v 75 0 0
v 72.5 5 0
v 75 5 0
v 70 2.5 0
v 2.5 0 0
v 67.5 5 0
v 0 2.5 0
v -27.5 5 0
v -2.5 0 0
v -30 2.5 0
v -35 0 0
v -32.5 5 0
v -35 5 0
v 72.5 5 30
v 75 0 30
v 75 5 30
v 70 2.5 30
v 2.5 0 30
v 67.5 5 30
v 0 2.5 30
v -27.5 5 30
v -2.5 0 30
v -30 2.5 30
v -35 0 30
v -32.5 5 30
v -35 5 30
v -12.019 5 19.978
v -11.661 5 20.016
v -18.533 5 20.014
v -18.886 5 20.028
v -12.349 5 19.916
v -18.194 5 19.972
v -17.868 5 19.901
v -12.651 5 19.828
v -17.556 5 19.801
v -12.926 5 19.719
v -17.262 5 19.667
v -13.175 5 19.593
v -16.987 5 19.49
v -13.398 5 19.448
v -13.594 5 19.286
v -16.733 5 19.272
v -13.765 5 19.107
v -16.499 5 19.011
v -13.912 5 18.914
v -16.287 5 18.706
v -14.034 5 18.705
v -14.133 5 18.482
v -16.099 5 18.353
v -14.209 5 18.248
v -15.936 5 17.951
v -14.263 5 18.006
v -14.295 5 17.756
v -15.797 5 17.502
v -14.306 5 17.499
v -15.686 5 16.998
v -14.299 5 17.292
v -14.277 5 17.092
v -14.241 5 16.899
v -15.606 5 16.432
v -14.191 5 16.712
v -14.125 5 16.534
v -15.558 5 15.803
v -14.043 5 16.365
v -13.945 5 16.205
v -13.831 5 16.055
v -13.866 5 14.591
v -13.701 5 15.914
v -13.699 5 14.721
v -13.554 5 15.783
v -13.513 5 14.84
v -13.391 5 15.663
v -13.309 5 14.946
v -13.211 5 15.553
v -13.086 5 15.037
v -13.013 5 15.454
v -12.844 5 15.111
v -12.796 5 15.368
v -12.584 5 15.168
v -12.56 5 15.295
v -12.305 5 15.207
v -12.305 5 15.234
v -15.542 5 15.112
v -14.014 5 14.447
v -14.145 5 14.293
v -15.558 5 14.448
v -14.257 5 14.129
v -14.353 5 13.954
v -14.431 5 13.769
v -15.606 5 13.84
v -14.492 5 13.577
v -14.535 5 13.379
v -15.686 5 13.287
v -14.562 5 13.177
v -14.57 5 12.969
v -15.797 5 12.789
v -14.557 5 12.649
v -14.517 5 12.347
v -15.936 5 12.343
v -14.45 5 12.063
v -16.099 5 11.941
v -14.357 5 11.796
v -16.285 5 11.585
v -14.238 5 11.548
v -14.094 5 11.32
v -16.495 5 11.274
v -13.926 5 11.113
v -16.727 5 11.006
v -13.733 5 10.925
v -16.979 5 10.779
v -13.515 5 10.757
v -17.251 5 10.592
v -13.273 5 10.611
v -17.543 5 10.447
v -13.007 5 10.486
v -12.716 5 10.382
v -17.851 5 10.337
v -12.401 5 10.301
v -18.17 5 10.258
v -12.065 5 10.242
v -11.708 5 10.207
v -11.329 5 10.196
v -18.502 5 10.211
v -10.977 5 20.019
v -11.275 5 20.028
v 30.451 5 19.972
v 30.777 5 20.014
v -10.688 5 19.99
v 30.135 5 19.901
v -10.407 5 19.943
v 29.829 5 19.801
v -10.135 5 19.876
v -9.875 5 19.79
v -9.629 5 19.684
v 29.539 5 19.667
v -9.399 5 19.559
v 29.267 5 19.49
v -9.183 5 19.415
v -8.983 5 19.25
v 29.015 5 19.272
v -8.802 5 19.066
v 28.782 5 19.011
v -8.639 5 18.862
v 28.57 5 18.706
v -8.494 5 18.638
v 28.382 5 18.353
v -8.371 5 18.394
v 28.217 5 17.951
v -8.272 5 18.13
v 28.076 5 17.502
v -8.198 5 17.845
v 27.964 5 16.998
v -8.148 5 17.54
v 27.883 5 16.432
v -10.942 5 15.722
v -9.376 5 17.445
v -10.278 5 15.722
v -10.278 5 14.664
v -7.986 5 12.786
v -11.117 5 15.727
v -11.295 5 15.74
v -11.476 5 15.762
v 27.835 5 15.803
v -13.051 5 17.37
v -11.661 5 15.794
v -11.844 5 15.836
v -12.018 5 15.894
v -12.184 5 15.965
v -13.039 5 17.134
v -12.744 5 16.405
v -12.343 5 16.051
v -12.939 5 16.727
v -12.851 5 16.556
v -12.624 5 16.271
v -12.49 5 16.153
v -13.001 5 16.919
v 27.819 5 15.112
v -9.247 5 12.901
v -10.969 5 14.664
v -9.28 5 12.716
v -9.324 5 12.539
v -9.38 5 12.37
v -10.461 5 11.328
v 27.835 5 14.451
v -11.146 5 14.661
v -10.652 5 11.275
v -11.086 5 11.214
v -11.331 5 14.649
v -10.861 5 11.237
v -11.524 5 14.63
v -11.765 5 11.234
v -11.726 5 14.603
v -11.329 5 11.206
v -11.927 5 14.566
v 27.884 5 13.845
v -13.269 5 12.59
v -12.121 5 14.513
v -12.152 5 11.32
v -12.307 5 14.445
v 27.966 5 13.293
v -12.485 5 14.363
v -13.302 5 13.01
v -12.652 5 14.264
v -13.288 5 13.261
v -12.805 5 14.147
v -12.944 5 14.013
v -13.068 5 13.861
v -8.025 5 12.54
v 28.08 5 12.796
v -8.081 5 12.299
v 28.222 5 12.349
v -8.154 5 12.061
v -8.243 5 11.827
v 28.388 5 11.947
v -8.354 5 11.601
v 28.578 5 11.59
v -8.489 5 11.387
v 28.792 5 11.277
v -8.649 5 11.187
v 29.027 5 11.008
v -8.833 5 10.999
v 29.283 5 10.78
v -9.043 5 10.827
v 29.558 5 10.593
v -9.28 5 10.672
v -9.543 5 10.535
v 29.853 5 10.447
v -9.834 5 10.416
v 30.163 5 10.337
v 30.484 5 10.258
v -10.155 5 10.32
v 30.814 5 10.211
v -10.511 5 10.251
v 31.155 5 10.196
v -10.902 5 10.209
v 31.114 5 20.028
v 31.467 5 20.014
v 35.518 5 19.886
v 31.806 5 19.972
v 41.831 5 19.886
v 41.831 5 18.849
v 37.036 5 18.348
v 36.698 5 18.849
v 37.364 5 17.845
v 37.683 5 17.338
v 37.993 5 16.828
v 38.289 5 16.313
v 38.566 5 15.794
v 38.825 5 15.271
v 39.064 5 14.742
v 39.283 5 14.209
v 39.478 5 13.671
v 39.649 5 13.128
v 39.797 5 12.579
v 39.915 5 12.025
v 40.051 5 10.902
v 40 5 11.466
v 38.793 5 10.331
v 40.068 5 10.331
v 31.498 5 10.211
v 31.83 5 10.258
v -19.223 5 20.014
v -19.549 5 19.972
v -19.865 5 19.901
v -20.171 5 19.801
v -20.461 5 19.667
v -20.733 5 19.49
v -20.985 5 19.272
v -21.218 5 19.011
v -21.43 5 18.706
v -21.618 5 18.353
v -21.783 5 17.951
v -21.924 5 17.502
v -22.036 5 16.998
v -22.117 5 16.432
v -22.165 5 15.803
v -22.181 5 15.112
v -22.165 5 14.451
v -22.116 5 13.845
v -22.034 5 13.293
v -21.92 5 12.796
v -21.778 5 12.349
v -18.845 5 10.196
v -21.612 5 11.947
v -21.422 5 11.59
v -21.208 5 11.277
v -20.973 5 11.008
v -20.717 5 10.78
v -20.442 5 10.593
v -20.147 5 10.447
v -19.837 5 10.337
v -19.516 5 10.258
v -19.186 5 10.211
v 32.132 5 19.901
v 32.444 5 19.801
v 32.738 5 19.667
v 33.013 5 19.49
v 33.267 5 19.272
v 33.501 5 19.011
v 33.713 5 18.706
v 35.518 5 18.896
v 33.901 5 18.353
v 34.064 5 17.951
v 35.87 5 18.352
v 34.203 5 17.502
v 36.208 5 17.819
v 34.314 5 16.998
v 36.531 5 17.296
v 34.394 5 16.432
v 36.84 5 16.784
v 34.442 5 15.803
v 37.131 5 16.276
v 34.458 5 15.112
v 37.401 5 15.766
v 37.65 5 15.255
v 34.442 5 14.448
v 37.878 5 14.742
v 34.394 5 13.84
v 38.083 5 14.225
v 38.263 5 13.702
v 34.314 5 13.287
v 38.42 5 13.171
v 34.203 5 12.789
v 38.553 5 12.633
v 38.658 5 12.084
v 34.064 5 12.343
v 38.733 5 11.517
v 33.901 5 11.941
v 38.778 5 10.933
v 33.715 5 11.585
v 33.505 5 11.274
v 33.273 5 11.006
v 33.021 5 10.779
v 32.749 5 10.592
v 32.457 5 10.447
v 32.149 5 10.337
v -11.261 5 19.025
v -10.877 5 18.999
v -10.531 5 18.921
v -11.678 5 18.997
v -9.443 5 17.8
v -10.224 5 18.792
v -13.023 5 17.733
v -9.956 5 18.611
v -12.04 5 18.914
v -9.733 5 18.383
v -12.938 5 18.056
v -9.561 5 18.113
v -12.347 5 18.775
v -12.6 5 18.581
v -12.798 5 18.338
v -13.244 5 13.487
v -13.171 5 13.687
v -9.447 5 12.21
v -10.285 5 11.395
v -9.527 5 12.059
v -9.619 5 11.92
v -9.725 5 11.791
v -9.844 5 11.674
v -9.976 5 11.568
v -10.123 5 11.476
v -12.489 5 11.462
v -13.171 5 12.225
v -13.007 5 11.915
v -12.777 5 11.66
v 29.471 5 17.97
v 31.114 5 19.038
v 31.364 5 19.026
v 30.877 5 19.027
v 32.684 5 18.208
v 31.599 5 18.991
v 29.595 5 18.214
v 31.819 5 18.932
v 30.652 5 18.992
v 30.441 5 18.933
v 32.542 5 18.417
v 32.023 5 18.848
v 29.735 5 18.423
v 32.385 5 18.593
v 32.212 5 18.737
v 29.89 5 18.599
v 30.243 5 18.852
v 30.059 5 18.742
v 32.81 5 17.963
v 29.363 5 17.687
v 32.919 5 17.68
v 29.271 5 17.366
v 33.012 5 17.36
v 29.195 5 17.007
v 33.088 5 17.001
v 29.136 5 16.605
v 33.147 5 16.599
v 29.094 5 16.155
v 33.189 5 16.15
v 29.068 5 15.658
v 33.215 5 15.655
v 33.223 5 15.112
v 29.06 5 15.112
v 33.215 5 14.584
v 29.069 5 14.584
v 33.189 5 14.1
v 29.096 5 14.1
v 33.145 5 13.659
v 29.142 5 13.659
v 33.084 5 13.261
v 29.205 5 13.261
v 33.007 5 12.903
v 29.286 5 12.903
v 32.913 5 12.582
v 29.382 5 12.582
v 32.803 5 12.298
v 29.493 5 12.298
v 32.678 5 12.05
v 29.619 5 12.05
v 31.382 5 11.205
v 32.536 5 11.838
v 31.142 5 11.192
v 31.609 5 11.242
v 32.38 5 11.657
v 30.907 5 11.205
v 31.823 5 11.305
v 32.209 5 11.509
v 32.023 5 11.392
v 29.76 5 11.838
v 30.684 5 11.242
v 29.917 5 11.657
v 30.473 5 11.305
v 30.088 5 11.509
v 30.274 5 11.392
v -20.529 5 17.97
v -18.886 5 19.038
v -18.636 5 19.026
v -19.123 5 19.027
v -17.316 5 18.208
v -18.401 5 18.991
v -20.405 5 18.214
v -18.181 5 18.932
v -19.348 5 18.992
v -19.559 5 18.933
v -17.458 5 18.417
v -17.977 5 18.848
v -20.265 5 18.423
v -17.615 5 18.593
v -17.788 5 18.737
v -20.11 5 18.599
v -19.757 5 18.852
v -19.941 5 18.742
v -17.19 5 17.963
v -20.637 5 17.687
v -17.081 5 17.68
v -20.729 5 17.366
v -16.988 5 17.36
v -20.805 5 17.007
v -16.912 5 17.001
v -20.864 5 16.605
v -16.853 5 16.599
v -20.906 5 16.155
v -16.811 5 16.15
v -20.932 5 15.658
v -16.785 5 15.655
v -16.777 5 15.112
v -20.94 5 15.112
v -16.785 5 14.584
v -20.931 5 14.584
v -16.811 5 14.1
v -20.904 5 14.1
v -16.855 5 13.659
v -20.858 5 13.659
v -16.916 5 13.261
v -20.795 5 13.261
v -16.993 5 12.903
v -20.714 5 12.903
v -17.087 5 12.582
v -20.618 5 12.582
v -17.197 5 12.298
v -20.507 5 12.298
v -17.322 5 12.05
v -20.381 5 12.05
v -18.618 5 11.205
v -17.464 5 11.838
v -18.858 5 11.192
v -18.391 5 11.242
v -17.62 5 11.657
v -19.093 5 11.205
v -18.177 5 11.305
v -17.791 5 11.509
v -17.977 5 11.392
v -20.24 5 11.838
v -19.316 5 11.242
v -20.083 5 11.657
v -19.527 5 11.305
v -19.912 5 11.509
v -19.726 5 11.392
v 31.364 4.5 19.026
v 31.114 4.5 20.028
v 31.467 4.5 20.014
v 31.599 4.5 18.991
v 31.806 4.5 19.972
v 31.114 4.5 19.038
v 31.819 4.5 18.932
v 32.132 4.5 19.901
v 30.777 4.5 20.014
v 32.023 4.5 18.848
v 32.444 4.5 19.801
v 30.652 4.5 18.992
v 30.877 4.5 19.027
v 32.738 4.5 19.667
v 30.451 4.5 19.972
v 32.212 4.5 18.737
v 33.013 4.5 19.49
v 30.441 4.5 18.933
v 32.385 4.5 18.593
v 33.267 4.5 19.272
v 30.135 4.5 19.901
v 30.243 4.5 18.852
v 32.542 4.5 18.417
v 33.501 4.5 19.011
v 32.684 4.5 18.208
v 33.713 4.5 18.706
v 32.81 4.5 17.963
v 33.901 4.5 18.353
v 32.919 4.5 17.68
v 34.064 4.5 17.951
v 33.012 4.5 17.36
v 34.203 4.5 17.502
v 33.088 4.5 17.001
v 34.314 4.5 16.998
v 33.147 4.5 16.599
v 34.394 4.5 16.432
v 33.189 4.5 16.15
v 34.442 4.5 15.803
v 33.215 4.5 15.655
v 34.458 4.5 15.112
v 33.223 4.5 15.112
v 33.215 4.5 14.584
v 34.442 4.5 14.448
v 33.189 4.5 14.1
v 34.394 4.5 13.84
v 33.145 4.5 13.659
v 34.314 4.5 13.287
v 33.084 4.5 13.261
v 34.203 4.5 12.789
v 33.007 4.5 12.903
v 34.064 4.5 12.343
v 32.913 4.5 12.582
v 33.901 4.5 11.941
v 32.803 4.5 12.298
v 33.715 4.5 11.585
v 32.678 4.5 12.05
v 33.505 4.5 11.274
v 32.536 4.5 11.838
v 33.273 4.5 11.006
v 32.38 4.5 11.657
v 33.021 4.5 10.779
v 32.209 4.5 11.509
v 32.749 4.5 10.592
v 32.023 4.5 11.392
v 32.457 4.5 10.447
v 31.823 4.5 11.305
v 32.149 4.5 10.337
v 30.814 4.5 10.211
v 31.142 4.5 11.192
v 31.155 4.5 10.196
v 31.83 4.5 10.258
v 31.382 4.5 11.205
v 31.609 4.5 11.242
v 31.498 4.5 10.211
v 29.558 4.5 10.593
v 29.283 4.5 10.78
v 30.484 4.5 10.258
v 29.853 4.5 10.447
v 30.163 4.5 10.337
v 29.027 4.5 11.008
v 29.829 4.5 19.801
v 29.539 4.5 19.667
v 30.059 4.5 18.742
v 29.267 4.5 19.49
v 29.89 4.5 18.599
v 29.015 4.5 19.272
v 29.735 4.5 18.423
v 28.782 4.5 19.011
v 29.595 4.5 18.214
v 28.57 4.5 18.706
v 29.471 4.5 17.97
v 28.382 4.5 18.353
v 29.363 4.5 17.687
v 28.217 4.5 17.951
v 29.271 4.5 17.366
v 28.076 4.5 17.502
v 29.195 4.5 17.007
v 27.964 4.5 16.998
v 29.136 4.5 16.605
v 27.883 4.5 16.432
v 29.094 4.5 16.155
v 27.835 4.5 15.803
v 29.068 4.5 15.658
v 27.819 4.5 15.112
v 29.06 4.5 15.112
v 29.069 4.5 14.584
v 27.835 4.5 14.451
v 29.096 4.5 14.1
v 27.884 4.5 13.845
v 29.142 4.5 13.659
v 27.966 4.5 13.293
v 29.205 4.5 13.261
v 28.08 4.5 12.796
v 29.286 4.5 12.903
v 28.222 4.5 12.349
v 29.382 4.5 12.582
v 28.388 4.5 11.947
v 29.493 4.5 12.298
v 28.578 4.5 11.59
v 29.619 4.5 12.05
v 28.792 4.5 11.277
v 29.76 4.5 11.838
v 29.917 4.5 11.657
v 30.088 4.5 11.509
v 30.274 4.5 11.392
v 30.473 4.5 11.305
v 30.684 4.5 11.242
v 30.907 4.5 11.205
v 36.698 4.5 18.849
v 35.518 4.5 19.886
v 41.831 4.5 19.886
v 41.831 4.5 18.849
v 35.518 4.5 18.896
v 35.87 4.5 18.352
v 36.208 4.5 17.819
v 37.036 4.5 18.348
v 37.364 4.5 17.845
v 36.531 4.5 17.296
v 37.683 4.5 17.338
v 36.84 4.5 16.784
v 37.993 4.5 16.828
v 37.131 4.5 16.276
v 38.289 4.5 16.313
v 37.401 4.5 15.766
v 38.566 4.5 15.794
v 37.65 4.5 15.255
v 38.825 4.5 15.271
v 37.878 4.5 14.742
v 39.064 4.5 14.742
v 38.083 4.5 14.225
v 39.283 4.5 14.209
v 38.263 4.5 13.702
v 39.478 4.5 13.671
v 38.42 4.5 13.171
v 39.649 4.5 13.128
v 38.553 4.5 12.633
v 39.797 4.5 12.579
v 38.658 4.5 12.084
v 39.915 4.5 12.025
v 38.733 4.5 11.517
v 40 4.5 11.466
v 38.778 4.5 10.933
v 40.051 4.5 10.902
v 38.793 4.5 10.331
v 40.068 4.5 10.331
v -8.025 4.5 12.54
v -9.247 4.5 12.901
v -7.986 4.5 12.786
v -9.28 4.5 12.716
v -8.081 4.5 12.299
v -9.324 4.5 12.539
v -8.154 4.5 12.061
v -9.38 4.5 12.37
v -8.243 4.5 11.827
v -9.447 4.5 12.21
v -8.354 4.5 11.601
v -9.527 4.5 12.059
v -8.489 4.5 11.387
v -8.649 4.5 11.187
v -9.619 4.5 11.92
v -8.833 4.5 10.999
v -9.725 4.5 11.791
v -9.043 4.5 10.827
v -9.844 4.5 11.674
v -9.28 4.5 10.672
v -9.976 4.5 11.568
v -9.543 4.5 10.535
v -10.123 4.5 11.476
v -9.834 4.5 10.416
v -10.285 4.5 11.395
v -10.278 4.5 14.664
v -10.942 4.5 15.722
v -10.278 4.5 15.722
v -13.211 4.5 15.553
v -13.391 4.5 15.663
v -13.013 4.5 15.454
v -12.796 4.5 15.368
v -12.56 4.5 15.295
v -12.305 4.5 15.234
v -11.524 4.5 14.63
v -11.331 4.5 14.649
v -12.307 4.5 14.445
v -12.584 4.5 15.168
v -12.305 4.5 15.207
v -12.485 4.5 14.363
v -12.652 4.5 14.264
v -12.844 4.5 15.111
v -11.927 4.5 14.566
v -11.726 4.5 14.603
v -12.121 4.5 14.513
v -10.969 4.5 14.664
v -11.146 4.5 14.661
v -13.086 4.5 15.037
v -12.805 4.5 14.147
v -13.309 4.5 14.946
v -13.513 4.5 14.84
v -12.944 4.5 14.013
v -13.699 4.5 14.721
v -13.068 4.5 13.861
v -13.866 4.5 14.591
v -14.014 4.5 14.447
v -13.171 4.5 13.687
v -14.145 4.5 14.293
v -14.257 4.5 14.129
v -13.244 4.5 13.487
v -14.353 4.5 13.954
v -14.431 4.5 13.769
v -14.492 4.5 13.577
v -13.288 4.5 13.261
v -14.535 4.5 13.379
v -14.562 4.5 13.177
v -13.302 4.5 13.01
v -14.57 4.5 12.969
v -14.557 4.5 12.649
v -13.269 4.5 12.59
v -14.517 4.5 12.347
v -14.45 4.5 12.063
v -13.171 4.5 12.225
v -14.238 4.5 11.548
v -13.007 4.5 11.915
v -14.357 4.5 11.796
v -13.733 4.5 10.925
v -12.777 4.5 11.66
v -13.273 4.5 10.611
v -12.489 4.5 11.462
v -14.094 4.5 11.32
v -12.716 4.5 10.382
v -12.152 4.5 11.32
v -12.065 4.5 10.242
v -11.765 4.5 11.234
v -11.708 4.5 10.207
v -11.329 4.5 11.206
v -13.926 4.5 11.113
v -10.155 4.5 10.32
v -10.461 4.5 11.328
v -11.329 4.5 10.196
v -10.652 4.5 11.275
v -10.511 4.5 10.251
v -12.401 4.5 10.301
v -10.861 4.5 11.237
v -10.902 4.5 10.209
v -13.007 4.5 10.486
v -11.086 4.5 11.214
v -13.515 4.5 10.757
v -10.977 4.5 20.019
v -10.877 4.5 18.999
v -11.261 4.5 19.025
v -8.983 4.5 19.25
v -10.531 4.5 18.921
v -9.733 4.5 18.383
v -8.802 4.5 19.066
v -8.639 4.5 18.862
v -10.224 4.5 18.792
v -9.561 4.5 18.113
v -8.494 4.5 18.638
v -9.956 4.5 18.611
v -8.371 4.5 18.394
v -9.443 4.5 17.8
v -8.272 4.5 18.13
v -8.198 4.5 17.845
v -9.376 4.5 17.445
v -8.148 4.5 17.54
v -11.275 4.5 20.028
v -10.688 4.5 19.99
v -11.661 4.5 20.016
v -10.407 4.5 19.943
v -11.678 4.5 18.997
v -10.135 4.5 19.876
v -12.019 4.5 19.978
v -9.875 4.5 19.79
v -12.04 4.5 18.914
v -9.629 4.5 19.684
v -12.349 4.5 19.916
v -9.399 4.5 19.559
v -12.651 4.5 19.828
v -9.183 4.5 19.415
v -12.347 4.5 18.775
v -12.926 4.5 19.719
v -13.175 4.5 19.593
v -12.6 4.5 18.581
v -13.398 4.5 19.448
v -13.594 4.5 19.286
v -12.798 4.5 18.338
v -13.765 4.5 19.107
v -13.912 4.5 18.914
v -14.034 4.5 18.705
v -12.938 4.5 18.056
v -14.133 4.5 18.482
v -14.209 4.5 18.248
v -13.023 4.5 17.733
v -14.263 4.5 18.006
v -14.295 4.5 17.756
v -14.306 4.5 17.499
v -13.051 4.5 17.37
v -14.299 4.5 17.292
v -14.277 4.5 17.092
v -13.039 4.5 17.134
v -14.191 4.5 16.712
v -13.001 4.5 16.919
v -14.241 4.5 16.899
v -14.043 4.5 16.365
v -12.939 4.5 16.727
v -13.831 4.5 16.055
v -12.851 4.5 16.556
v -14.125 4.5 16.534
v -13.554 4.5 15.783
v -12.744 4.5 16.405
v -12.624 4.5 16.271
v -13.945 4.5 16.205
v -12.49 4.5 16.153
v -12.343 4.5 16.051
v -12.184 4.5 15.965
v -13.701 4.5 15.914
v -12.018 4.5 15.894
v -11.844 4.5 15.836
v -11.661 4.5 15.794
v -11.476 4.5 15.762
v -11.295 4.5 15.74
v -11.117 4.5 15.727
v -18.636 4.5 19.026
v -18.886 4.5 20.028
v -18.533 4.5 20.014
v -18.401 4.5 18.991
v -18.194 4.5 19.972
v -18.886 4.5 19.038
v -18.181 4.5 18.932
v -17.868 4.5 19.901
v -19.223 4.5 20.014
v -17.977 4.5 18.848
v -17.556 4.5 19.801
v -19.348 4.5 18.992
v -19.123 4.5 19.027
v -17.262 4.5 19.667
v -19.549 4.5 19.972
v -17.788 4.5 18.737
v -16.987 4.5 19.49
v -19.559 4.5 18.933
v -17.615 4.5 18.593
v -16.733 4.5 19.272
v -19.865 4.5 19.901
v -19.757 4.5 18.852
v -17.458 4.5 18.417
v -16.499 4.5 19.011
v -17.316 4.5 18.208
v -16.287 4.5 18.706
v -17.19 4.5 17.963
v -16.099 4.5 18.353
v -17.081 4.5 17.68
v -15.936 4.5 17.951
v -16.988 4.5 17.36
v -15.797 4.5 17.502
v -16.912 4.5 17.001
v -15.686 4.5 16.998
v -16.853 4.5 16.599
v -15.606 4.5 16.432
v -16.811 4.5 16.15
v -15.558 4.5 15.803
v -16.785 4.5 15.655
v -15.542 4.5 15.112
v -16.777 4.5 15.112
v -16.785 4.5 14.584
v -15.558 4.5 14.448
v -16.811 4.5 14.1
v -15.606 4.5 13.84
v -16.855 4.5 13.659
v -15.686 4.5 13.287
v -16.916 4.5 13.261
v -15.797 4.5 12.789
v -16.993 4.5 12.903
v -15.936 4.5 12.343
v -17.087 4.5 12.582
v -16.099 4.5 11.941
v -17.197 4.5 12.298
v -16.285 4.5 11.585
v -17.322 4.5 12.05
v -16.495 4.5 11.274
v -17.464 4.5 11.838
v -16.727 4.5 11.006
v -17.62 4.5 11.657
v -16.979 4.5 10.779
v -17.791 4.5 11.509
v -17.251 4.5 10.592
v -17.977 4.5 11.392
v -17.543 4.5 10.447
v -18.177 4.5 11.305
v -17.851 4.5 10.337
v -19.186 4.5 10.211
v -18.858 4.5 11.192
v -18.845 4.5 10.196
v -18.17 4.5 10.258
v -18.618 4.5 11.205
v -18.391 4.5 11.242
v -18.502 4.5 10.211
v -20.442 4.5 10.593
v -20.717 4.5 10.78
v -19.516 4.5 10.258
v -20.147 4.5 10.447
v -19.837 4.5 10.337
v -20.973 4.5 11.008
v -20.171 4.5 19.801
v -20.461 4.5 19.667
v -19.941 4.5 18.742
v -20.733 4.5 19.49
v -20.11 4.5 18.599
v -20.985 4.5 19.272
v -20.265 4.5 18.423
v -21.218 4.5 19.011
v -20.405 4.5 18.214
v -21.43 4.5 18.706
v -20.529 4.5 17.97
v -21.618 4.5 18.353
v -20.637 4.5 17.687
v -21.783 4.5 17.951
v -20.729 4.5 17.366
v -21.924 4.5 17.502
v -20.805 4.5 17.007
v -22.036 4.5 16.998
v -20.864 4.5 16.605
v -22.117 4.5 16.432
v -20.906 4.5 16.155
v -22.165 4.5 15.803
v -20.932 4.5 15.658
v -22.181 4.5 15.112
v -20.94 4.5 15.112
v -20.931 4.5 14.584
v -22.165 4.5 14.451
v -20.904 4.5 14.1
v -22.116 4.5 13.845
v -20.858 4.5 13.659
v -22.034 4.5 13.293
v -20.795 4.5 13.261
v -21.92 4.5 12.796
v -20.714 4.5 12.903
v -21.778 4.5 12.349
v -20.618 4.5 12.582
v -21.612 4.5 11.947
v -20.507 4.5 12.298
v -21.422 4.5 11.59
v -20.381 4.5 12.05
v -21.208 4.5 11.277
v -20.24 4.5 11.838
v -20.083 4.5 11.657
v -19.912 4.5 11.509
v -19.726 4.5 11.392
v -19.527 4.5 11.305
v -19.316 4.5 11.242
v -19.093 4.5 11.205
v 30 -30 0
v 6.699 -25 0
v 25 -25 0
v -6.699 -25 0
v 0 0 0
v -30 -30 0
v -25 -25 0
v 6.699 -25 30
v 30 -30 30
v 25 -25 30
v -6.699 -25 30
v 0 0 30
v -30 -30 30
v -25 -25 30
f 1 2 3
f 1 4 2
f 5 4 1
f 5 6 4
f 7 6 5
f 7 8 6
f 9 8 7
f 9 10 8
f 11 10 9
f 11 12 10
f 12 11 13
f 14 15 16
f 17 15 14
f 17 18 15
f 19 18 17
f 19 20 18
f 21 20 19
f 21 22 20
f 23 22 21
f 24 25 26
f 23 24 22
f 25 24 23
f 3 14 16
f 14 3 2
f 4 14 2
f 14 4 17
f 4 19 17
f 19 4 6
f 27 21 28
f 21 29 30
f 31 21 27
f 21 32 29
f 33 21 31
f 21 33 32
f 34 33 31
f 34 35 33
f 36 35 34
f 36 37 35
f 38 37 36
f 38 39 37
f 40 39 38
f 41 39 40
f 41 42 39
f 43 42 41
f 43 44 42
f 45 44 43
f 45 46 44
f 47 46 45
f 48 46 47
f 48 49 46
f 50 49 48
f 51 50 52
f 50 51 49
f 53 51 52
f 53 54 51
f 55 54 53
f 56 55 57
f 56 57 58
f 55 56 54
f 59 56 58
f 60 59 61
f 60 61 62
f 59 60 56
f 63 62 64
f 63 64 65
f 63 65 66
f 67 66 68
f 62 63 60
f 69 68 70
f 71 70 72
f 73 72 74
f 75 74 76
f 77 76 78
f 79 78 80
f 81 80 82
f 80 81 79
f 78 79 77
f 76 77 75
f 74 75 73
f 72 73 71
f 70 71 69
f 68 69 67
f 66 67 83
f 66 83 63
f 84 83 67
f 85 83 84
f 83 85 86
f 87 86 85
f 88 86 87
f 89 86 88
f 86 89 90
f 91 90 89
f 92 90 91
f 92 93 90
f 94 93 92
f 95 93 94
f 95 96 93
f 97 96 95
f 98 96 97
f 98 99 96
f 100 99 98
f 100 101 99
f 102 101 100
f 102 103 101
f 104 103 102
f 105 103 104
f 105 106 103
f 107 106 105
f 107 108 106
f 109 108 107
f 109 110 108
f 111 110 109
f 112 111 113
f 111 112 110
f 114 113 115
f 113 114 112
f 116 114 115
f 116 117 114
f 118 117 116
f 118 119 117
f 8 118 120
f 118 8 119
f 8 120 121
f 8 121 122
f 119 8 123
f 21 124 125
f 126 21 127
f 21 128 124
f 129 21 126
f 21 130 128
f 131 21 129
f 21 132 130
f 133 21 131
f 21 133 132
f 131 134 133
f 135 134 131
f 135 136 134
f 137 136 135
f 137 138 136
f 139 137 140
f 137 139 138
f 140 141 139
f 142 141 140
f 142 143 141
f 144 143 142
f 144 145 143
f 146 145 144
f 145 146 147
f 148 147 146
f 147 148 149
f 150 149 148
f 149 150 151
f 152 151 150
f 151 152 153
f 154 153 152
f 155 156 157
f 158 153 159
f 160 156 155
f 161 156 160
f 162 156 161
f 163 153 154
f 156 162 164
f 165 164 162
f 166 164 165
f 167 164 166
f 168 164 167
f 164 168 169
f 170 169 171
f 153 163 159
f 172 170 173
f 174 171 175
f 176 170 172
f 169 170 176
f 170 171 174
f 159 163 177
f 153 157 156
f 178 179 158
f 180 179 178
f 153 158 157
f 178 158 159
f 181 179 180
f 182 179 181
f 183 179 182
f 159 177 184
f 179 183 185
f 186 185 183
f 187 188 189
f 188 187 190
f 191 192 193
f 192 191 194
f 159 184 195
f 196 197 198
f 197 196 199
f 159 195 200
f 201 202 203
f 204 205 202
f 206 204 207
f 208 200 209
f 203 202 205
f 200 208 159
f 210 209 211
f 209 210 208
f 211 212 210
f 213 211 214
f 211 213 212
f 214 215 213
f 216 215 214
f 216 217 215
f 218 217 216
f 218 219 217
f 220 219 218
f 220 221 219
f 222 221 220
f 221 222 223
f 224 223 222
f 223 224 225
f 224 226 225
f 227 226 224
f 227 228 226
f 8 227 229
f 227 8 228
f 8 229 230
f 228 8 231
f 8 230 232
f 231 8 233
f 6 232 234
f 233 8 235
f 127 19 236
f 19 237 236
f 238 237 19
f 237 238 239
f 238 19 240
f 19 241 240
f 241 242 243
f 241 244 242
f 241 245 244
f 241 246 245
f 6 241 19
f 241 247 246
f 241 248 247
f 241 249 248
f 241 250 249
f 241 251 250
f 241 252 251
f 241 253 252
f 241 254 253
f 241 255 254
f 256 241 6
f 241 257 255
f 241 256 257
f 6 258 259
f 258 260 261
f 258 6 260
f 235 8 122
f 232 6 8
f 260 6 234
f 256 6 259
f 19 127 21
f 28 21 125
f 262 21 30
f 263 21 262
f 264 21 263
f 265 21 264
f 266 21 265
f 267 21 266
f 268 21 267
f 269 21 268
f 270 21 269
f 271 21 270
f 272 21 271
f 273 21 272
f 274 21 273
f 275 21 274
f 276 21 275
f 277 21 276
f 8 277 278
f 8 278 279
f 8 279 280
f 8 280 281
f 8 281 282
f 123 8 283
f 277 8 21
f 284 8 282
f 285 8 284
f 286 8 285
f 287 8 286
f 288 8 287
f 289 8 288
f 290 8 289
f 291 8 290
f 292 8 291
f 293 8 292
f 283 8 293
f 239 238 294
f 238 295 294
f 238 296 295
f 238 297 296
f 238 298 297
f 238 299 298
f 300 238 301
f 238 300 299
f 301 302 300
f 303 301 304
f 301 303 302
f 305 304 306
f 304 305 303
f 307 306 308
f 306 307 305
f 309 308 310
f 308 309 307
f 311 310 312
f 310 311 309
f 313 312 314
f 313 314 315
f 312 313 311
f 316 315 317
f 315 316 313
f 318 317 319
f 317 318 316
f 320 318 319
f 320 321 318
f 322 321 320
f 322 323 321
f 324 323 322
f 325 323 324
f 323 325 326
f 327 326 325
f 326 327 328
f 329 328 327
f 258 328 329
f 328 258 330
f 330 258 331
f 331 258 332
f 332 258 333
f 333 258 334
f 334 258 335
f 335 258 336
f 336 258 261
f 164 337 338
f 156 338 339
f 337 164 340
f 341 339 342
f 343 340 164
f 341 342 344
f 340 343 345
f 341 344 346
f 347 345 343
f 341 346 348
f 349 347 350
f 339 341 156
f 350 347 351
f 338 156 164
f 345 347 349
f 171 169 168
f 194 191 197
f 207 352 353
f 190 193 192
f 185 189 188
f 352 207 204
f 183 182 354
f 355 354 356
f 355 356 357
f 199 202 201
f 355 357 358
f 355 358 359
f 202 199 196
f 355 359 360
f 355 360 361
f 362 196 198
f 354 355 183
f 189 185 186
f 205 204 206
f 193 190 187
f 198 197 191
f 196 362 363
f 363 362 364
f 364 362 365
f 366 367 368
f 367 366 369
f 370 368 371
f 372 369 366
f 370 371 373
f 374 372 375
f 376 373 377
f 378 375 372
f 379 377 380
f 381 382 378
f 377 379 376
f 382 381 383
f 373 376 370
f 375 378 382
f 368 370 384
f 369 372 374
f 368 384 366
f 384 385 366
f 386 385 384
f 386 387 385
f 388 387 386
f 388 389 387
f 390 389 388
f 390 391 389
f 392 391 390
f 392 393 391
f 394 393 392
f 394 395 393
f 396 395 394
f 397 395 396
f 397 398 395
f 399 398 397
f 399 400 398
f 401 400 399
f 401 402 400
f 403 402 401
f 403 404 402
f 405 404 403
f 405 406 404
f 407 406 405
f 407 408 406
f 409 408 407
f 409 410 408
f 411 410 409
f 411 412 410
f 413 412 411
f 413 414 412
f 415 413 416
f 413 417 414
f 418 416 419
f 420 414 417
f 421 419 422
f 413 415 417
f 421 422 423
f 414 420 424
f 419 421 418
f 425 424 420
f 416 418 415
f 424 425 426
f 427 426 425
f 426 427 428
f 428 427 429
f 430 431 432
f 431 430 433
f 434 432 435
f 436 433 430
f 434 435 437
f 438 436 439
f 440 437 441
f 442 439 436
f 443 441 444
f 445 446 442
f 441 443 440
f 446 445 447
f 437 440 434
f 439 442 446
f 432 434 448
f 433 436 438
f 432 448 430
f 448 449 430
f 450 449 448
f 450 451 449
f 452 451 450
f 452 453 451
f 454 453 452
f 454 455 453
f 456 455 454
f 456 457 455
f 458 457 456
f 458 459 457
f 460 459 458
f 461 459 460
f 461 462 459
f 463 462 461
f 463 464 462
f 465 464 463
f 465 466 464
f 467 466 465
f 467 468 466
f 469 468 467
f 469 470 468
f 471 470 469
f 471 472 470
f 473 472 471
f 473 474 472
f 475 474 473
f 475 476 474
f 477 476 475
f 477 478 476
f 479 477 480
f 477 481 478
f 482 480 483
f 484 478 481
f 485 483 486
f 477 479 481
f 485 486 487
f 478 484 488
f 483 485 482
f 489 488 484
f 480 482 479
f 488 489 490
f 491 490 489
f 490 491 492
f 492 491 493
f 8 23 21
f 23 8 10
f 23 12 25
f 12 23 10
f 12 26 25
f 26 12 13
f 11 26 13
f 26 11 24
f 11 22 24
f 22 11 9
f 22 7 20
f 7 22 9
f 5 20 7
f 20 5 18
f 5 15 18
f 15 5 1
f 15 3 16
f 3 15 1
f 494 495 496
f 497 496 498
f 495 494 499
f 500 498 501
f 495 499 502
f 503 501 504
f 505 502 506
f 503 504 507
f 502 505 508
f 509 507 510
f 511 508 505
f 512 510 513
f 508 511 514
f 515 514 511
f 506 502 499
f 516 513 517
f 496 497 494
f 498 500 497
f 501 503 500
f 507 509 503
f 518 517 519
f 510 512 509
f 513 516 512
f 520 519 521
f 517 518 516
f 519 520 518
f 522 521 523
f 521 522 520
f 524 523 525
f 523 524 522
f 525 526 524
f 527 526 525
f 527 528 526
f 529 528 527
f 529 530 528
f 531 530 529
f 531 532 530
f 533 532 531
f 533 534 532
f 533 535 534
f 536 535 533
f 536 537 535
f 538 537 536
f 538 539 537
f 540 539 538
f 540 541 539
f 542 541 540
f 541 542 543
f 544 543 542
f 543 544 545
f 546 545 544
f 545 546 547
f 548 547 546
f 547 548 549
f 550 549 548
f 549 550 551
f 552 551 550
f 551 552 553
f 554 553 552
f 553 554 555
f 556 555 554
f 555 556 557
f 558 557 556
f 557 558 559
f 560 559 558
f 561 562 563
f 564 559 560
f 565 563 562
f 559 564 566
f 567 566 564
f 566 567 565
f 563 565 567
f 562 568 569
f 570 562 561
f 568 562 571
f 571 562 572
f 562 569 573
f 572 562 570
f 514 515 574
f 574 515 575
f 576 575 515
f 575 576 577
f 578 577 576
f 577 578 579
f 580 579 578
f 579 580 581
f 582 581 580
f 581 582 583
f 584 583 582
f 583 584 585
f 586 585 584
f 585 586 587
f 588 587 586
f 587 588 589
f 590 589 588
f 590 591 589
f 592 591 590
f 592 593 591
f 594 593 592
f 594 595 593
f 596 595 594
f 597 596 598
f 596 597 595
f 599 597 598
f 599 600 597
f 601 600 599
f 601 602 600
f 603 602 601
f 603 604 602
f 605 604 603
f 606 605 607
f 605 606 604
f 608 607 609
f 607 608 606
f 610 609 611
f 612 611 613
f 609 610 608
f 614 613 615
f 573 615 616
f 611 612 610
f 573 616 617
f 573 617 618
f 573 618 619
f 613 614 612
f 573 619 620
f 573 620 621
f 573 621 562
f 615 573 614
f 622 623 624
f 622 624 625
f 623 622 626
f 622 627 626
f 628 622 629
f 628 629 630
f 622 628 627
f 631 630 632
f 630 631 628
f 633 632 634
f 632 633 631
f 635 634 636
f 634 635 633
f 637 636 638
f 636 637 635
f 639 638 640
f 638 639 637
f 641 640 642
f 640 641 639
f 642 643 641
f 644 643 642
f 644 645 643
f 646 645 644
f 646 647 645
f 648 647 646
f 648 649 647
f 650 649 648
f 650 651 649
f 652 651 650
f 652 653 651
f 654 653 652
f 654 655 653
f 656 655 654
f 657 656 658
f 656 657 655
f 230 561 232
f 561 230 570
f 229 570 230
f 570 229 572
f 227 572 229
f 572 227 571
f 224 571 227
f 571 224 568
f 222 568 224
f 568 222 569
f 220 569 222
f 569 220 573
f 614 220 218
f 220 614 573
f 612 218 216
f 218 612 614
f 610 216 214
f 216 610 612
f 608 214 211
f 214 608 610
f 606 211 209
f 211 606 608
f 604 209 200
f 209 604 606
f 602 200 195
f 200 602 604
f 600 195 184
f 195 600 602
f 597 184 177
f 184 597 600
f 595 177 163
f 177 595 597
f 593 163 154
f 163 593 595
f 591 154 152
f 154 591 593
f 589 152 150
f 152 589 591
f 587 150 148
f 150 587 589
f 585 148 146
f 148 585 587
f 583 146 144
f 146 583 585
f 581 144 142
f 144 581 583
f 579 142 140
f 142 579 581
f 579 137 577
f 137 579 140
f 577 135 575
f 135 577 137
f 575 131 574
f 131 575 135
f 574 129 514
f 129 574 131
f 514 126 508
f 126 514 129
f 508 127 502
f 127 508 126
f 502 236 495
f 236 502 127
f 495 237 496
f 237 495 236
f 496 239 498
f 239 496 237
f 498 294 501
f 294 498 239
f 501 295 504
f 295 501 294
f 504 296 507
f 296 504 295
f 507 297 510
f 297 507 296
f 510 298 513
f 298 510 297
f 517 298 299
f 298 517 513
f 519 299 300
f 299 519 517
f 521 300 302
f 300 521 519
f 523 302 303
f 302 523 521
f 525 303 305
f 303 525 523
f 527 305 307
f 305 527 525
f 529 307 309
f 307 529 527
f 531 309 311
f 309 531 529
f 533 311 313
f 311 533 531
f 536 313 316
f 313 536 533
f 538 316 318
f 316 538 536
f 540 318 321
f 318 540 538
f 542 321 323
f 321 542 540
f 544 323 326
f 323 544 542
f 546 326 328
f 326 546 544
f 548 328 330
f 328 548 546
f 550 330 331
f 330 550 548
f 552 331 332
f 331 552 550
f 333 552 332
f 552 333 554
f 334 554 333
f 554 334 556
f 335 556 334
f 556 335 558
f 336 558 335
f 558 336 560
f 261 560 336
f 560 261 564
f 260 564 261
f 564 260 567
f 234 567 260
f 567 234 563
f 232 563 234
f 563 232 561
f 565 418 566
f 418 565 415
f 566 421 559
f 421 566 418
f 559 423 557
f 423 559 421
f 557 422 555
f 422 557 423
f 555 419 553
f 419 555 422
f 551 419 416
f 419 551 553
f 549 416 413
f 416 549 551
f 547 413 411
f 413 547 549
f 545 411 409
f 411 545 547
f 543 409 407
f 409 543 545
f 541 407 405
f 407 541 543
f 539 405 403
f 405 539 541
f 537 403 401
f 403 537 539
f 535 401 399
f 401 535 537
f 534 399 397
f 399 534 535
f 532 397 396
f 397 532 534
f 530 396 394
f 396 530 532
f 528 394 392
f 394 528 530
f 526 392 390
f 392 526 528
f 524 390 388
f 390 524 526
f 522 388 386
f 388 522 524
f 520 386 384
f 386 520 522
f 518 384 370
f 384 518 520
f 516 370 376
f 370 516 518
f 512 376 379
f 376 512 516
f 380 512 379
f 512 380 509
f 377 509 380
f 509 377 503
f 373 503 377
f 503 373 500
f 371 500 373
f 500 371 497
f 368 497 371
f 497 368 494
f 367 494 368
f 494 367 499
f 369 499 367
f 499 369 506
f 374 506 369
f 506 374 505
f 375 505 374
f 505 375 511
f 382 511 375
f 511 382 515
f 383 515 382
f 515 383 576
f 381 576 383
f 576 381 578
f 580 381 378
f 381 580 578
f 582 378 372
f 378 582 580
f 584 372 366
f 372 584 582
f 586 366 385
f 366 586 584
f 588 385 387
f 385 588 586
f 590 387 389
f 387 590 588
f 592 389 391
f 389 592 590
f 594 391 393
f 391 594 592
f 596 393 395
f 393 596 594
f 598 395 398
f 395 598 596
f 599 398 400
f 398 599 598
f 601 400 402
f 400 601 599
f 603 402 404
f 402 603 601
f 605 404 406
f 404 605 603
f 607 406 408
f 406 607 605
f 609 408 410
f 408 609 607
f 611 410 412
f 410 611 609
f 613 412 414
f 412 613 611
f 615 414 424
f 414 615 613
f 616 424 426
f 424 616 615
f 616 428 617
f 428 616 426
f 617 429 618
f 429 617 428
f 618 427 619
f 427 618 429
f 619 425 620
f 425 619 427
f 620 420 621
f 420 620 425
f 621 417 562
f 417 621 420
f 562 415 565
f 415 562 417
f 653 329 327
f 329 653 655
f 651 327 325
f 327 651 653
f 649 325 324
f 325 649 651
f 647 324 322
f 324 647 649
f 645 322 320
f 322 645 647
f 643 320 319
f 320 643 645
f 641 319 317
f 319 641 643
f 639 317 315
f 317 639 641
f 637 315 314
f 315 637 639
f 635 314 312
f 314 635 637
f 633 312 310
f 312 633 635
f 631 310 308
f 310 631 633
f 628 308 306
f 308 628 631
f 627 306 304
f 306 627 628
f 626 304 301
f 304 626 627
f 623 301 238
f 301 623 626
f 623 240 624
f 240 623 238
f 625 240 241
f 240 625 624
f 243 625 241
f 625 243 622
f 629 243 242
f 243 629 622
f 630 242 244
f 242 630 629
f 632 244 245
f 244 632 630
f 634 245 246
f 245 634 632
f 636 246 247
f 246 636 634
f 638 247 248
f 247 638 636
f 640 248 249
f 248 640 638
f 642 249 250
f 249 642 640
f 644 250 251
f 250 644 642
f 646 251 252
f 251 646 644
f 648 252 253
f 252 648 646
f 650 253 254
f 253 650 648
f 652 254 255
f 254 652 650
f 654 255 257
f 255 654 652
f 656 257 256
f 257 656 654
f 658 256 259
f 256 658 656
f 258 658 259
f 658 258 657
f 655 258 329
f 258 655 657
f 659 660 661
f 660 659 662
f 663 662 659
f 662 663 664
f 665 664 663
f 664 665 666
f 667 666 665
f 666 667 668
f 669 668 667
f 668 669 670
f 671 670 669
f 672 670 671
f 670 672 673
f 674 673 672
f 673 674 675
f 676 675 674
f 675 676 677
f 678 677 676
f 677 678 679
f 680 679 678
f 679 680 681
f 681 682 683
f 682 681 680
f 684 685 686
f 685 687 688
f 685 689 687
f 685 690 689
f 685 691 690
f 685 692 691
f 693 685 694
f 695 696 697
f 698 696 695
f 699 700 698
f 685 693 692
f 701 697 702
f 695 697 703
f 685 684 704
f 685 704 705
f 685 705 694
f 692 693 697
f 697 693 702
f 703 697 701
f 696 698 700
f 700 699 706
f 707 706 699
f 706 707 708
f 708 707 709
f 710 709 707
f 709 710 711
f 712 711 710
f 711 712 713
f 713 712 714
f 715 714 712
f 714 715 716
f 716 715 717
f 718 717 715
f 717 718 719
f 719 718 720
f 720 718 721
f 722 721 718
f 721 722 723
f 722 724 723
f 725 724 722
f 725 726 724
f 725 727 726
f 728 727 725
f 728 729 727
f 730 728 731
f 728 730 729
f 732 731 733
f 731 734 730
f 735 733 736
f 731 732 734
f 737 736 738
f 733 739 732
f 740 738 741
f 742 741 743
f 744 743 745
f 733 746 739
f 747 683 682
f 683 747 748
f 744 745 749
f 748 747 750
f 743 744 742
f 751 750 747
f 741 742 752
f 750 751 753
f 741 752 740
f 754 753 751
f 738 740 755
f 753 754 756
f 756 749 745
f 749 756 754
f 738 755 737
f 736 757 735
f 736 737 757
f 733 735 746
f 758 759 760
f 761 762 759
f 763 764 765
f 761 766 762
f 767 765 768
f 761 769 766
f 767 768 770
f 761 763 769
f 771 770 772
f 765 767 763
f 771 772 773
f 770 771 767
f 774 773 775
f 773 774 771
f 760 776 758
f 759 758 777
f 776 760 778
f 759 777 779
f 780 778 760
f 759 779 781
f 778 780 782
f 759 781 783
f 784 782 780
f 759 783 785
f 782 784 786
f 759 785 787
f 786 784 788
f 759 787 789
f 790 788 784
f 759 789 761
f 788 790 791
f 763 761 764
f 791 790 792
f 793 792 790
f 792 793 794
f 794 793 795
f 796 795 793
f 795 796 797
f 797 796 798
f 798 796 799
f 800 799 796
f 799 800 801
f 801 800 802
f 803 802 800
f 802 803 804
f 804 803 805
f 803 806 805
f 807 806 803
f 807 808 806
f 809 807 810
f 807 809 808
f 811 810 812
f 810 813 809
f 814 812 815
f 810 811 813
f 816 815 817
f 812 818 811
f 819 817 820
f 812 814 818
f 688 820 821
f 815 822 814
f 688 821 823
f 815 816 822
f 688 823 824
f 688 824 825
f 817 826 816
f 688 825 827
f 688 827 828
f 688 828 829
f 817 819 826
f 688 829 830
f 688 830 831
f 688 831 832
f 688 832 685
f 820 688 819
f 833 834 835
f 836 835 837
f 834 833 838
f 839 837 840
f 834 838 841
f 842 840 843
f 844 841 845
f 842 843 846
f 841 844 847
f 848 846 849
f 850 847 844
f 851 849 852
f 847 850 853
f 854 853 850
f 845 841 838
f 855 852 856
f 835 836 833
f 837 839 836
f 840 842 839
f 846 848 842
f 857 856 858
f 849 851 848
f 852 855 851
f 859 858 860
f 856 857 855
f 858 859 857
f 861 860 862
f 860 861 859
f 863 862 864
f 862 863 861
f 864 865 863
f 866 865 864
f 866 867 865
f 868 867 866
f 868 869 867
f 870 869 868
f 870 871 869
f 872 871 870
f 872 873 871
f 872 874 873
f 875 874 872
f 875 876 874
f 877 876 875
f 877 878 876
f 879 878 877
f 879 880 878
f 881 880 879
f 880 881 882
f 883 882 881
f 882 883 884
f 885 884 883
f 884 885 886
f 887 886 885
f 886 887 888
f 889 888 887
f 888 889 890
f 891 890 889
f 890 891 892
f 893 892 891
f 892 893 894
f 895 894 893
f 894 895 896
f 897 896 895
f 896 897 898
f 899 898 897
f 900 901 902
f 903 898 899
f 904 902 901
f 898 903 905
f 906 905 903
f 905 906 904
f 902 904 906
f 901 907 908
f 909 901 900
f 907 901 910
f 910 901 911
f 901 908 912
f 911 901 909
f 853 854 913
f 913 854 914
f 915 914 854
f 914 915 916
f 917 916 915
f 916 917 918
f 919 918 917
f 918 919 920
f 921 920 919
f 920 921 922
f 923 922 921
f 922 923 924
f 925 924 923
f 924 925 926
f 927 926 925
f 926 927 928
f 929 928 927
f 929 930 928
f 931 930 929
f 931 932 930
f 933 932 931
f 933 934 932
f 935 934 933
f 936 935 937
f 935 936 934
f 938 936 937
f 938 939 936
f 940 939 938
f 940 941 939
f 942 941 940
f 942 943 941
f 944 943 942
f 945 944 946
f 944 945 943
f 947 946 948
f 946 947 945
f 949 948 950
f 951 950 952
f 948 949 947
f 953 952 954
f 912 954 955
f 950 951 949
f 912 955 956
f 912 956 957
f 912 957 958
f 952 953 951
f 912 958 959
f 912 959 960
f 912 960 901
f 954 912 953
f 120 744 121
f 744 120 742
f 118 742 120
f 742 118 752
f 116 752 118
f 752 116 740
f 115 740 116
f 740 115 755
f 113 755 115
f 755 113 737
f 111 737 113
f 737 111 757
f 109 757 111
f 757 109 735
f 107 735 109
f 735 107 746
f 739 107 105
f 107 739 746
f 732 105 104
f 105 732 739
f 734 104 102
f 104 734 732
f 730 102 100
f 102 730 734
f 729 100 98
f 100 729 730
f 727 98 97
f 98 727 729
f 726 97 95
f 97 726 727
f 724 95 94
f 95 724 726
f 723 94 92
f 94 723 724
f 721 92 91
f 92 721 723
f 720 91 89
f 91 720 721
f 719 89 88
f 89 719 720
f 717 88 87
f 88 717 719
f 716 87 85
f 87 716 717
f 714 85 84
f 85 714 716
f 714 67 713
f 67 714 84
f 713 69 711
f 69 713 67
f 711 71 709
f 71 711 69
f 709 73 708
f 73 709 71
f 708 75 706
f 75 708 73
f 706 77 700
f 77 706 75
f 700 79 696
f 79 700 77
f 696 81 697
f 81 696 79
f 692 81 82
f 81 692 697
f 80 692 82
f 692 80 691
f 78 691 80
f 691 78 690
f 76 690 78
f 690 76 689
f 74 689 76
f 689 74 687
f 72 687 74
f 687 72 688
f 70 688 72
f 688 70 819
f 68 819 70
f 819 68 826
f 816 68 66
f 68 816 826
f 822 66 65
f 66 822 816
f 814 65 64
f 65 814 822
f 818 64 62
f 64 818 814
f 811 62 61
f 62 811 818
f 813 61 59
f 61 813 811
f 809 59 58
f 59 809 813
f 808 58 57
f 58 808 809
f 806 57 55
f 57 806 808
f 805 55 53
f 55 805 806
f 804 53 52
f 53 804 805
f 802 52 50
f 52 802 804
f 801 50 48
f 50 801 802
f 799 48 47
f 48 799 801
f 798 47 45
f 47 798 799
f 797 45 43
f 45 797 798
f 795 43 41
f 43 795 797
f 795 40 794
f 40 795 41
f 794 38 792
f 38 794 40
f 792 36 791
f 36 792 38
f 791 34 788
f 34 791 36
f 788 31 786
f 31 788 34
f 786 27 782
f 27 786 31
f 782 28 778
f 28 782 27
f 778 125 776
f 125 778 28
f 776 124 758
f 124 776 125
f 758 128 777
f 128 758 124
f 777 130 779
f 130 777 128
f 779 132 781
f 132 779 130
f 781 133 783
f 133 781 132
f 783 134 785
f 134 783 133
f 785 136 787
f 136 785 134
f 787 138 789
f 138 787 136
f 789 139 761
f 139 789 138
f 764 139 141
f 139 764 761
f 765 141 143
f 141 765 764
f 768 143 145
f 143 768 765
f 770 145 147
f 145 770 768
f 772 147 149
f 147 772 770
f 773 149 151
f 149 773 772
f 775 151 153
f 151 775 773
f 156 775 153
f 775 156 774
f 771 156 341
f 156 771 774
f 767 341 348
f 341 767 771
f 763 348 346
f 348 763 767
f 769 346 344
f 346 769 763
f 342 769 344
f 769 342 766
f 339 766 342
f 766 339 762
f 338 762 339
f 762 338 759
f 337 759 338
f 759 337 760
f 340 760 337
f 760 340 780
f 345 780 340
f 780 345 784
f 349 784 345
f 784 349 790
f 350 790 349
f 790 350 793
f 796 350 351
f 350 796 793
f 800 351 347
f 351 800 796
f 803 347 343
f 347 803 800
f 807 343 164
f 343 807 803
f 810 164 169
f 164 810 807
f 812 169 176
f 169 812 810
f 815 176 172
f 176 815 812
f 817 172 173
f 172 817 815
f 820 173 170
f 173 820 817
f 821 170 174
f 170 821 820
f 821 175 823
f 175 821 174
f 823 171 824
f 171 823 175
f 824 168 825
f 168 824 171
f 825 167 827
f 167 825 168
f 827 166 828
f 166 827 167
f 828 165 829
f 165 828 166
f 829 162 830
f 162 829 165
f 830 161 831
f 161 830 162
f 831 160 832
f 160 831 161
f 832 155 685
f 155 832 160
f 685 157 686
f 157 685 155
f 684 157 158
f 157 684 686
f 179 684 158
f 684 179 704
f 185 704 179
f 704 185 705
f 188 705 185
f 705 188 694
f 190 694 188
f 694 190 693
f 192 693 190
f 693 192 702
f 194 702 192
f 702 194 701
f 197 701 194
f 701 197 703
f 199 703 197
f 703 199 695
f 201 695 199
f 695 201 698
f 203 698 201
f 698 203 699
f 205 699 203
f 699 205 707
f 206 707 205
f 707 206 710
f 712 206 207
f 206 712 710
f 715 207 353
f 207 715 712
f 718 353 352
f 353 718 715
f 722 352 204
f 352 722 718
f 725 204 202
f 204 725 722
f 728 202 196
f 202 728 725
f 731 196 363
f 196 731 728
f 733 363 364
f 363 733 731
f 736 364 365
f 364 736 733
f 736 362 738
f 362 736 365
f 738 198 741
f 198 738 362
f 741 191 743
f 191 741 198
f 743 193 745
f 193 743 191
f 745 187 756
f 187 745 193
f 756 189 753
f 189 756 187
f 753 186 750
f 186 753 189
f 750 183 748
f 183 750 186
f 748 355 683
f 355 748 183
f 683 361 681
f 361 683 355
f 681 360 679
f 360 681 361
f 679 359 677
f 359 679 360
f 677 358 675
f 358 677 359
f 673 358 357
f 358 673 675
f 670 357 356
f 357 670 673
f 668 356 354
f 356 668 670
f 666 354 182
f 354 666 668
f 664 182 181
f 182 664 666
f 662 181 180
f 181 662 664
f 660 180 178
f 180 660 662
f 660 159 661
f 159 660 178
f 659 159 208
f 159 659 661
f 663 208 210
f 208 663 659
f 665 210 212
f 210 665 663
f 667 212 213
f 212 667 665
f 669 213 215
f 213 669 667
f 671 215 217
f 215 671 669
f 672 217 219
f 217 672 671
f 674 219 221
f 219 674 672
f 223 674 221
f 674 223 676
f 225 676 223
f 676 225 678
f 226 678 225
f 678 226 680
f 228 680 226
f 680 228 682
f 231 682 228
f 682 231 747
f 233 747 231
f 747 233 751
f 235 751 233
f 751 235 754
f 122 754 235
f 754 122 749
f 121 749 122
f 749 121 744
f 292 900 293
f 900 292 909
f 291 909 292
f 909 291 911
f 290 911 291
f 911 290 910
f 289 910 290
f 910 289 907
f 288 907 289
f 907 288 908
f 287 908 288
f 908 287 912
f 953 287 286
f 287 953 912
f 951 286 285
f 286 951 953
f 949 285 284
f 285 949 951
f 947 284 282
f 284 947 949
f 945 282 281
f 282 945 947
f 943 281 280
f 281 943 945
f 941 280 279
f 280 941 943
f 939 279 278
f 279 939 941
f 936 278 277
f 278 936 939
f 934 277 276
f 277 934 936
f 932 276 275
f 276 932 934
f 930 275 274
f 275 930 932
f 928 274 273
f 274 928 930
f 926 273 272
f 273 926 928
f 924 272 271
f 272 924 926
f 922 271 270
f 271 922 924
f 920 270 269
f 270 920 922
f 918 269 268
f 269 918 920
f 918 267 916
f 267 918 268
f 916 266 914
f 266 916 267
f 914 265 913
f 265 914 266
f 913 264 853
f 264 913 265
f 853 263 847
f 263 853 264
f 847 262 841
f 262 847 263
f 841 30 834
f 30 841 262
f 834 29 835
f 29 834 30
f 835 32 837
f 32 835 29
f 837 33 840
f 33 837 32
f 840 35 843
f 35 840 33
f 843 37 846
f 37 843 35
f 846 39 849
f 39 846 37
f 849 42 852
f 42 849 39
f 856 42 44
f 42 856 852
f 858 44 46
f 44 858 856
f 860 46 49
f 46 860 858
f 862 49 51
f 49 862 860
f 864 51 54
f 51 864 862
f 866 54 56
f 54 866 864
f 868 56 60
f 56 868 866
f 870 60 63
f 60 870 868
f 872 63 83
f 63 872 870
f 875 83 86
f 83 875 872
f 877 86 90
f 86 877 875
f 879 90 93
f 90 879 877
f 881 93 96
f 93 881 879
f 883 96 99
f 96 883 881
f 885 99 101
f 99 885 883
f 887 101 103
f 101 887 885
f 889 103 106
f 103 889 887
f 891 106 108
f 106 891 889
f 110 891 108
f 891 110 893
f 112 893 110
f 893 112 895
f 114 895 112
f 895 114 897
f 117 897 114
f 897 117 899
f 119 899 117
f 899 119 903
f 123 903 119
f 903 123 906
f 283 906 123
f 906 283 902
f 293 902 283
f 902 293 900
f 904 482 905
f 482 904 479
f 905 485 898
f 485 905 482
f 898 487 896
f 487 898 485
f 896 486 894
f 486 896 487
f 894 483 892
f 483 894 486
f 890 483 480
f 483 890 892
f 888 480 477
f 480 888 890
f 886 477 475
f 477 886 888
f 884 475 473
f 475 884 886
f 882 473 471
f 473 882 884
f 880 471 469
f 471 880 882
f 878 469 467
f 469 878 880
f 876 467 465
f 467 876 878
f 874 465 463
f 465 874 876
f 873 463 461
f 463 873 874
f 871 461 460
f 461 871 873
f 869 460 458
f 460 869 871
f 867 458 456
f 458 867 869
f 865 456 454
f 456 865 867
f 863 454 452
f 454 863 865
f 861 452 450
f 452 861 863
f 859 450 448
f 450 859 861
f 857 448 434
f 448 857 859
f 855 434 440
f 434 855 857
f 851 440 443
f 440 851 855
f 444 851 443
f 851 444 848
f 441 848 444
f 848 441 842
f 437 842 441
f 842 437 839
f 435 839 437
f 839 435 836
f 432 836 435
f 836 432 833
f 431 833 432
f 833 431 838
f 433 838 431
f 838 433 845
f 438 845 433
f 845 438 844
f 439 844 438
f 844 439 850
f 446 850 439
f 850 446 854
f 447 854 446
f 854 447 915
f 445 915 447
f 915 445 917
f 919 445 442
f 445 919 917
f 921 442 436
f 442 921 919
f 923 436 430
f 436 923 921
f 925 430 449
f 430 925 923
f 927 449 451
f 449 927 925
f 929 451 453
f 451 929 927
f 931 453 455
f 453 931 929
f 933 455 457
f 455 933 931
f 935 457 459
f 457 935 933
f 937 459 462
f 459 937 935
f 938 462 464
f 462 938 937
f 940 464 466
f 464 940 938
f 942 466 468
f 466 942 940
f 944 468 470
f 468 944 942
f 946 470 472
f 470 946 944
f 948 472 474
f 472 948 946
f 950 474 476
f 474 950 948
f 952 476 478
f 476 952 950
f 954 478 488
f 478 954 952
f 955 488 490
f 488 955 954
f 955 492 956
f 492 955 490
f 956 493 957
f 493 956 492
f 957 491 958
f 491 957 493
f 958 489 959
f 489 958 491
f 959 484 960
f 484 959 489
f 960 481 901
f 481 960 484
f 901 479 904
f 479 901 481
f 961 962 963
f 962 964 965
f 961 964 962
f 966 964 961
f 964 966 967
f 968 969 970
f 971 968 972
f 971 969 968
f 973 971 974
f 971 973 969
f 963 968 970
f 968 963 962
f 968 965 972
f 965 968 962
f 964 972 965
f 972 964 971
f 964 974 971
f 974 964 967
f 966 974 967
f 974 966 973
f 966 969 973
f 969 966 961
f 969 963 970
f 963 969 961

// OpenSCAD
// A model which creates all three classes of lever
// Percentage on either side of fulcrum printed on lever
// Designed to be printed on its side 
// File lever.scad

lever = [70, 30]; //Length of the on either side of the fulcrum (class 1) or
                  // load or resistance application point (class 2/3)
class = 1; //class of lever 
fulcrum_height = 30; //height of point of fulcrum, in mm
width = 30;  //width in mm


linear_extrude(width, convexity = 5) difference() {
	intersection() {
		square(fulcrum_height * 2, center = true);
		rotate(-135) square(fulcrum_height * sqrt(2));
	}
	difference() {
		square(fulcrum_height * 2 - 10, center = true);
		intersection_for(a = [1, -1]) 
                                         rotate(-135 + a * (45 - 15)) square(fulcrum_height * sqrt(2));
	}
}

difference() {
	linear_extrude(width, convexity = 5) difference() {
		translate([-5 - ((class == 1) ? lever[1] : 0), 0, 0]) 
                                                square([10 + lever[0] + lever[1], 5]);
		translate([0, 2.5, 0]) rotate(-135) square(5);
		translate([lever[0], 2.5, 0]) rotate(((class == 3) ? -135 : 45)) square(5);
		translate([((class == 1) ? -lever[1] : lever[0] + lever[1]), 2.5, 0]) 
                                    rotate(((class == 2) ? -135 : 45)) square(5);
		
	}
	translate([lever[0] / 2, 5, width / 2])
		rotate([90, 0, 180])
			linear_extrude(height = 1, center = true, convexity = 5) 
				text(str(lever[0]), size = min(width / 3, lever[0] / 3), 
                                                                         halign = "center", valign = "center");
	translate([(class == 1) ? -lever[1] / 2 : lever[0] + lever[1] / 2, 5, width / 2])
		rotate([90, 0, 180])
			linear_extrude(height = 1, center = true, convexity = 5) 
				text(str(lever[1]), size = min(width / 3, lever[1] / 3), 
                                                                         halign = "center", valign = "center");
}
